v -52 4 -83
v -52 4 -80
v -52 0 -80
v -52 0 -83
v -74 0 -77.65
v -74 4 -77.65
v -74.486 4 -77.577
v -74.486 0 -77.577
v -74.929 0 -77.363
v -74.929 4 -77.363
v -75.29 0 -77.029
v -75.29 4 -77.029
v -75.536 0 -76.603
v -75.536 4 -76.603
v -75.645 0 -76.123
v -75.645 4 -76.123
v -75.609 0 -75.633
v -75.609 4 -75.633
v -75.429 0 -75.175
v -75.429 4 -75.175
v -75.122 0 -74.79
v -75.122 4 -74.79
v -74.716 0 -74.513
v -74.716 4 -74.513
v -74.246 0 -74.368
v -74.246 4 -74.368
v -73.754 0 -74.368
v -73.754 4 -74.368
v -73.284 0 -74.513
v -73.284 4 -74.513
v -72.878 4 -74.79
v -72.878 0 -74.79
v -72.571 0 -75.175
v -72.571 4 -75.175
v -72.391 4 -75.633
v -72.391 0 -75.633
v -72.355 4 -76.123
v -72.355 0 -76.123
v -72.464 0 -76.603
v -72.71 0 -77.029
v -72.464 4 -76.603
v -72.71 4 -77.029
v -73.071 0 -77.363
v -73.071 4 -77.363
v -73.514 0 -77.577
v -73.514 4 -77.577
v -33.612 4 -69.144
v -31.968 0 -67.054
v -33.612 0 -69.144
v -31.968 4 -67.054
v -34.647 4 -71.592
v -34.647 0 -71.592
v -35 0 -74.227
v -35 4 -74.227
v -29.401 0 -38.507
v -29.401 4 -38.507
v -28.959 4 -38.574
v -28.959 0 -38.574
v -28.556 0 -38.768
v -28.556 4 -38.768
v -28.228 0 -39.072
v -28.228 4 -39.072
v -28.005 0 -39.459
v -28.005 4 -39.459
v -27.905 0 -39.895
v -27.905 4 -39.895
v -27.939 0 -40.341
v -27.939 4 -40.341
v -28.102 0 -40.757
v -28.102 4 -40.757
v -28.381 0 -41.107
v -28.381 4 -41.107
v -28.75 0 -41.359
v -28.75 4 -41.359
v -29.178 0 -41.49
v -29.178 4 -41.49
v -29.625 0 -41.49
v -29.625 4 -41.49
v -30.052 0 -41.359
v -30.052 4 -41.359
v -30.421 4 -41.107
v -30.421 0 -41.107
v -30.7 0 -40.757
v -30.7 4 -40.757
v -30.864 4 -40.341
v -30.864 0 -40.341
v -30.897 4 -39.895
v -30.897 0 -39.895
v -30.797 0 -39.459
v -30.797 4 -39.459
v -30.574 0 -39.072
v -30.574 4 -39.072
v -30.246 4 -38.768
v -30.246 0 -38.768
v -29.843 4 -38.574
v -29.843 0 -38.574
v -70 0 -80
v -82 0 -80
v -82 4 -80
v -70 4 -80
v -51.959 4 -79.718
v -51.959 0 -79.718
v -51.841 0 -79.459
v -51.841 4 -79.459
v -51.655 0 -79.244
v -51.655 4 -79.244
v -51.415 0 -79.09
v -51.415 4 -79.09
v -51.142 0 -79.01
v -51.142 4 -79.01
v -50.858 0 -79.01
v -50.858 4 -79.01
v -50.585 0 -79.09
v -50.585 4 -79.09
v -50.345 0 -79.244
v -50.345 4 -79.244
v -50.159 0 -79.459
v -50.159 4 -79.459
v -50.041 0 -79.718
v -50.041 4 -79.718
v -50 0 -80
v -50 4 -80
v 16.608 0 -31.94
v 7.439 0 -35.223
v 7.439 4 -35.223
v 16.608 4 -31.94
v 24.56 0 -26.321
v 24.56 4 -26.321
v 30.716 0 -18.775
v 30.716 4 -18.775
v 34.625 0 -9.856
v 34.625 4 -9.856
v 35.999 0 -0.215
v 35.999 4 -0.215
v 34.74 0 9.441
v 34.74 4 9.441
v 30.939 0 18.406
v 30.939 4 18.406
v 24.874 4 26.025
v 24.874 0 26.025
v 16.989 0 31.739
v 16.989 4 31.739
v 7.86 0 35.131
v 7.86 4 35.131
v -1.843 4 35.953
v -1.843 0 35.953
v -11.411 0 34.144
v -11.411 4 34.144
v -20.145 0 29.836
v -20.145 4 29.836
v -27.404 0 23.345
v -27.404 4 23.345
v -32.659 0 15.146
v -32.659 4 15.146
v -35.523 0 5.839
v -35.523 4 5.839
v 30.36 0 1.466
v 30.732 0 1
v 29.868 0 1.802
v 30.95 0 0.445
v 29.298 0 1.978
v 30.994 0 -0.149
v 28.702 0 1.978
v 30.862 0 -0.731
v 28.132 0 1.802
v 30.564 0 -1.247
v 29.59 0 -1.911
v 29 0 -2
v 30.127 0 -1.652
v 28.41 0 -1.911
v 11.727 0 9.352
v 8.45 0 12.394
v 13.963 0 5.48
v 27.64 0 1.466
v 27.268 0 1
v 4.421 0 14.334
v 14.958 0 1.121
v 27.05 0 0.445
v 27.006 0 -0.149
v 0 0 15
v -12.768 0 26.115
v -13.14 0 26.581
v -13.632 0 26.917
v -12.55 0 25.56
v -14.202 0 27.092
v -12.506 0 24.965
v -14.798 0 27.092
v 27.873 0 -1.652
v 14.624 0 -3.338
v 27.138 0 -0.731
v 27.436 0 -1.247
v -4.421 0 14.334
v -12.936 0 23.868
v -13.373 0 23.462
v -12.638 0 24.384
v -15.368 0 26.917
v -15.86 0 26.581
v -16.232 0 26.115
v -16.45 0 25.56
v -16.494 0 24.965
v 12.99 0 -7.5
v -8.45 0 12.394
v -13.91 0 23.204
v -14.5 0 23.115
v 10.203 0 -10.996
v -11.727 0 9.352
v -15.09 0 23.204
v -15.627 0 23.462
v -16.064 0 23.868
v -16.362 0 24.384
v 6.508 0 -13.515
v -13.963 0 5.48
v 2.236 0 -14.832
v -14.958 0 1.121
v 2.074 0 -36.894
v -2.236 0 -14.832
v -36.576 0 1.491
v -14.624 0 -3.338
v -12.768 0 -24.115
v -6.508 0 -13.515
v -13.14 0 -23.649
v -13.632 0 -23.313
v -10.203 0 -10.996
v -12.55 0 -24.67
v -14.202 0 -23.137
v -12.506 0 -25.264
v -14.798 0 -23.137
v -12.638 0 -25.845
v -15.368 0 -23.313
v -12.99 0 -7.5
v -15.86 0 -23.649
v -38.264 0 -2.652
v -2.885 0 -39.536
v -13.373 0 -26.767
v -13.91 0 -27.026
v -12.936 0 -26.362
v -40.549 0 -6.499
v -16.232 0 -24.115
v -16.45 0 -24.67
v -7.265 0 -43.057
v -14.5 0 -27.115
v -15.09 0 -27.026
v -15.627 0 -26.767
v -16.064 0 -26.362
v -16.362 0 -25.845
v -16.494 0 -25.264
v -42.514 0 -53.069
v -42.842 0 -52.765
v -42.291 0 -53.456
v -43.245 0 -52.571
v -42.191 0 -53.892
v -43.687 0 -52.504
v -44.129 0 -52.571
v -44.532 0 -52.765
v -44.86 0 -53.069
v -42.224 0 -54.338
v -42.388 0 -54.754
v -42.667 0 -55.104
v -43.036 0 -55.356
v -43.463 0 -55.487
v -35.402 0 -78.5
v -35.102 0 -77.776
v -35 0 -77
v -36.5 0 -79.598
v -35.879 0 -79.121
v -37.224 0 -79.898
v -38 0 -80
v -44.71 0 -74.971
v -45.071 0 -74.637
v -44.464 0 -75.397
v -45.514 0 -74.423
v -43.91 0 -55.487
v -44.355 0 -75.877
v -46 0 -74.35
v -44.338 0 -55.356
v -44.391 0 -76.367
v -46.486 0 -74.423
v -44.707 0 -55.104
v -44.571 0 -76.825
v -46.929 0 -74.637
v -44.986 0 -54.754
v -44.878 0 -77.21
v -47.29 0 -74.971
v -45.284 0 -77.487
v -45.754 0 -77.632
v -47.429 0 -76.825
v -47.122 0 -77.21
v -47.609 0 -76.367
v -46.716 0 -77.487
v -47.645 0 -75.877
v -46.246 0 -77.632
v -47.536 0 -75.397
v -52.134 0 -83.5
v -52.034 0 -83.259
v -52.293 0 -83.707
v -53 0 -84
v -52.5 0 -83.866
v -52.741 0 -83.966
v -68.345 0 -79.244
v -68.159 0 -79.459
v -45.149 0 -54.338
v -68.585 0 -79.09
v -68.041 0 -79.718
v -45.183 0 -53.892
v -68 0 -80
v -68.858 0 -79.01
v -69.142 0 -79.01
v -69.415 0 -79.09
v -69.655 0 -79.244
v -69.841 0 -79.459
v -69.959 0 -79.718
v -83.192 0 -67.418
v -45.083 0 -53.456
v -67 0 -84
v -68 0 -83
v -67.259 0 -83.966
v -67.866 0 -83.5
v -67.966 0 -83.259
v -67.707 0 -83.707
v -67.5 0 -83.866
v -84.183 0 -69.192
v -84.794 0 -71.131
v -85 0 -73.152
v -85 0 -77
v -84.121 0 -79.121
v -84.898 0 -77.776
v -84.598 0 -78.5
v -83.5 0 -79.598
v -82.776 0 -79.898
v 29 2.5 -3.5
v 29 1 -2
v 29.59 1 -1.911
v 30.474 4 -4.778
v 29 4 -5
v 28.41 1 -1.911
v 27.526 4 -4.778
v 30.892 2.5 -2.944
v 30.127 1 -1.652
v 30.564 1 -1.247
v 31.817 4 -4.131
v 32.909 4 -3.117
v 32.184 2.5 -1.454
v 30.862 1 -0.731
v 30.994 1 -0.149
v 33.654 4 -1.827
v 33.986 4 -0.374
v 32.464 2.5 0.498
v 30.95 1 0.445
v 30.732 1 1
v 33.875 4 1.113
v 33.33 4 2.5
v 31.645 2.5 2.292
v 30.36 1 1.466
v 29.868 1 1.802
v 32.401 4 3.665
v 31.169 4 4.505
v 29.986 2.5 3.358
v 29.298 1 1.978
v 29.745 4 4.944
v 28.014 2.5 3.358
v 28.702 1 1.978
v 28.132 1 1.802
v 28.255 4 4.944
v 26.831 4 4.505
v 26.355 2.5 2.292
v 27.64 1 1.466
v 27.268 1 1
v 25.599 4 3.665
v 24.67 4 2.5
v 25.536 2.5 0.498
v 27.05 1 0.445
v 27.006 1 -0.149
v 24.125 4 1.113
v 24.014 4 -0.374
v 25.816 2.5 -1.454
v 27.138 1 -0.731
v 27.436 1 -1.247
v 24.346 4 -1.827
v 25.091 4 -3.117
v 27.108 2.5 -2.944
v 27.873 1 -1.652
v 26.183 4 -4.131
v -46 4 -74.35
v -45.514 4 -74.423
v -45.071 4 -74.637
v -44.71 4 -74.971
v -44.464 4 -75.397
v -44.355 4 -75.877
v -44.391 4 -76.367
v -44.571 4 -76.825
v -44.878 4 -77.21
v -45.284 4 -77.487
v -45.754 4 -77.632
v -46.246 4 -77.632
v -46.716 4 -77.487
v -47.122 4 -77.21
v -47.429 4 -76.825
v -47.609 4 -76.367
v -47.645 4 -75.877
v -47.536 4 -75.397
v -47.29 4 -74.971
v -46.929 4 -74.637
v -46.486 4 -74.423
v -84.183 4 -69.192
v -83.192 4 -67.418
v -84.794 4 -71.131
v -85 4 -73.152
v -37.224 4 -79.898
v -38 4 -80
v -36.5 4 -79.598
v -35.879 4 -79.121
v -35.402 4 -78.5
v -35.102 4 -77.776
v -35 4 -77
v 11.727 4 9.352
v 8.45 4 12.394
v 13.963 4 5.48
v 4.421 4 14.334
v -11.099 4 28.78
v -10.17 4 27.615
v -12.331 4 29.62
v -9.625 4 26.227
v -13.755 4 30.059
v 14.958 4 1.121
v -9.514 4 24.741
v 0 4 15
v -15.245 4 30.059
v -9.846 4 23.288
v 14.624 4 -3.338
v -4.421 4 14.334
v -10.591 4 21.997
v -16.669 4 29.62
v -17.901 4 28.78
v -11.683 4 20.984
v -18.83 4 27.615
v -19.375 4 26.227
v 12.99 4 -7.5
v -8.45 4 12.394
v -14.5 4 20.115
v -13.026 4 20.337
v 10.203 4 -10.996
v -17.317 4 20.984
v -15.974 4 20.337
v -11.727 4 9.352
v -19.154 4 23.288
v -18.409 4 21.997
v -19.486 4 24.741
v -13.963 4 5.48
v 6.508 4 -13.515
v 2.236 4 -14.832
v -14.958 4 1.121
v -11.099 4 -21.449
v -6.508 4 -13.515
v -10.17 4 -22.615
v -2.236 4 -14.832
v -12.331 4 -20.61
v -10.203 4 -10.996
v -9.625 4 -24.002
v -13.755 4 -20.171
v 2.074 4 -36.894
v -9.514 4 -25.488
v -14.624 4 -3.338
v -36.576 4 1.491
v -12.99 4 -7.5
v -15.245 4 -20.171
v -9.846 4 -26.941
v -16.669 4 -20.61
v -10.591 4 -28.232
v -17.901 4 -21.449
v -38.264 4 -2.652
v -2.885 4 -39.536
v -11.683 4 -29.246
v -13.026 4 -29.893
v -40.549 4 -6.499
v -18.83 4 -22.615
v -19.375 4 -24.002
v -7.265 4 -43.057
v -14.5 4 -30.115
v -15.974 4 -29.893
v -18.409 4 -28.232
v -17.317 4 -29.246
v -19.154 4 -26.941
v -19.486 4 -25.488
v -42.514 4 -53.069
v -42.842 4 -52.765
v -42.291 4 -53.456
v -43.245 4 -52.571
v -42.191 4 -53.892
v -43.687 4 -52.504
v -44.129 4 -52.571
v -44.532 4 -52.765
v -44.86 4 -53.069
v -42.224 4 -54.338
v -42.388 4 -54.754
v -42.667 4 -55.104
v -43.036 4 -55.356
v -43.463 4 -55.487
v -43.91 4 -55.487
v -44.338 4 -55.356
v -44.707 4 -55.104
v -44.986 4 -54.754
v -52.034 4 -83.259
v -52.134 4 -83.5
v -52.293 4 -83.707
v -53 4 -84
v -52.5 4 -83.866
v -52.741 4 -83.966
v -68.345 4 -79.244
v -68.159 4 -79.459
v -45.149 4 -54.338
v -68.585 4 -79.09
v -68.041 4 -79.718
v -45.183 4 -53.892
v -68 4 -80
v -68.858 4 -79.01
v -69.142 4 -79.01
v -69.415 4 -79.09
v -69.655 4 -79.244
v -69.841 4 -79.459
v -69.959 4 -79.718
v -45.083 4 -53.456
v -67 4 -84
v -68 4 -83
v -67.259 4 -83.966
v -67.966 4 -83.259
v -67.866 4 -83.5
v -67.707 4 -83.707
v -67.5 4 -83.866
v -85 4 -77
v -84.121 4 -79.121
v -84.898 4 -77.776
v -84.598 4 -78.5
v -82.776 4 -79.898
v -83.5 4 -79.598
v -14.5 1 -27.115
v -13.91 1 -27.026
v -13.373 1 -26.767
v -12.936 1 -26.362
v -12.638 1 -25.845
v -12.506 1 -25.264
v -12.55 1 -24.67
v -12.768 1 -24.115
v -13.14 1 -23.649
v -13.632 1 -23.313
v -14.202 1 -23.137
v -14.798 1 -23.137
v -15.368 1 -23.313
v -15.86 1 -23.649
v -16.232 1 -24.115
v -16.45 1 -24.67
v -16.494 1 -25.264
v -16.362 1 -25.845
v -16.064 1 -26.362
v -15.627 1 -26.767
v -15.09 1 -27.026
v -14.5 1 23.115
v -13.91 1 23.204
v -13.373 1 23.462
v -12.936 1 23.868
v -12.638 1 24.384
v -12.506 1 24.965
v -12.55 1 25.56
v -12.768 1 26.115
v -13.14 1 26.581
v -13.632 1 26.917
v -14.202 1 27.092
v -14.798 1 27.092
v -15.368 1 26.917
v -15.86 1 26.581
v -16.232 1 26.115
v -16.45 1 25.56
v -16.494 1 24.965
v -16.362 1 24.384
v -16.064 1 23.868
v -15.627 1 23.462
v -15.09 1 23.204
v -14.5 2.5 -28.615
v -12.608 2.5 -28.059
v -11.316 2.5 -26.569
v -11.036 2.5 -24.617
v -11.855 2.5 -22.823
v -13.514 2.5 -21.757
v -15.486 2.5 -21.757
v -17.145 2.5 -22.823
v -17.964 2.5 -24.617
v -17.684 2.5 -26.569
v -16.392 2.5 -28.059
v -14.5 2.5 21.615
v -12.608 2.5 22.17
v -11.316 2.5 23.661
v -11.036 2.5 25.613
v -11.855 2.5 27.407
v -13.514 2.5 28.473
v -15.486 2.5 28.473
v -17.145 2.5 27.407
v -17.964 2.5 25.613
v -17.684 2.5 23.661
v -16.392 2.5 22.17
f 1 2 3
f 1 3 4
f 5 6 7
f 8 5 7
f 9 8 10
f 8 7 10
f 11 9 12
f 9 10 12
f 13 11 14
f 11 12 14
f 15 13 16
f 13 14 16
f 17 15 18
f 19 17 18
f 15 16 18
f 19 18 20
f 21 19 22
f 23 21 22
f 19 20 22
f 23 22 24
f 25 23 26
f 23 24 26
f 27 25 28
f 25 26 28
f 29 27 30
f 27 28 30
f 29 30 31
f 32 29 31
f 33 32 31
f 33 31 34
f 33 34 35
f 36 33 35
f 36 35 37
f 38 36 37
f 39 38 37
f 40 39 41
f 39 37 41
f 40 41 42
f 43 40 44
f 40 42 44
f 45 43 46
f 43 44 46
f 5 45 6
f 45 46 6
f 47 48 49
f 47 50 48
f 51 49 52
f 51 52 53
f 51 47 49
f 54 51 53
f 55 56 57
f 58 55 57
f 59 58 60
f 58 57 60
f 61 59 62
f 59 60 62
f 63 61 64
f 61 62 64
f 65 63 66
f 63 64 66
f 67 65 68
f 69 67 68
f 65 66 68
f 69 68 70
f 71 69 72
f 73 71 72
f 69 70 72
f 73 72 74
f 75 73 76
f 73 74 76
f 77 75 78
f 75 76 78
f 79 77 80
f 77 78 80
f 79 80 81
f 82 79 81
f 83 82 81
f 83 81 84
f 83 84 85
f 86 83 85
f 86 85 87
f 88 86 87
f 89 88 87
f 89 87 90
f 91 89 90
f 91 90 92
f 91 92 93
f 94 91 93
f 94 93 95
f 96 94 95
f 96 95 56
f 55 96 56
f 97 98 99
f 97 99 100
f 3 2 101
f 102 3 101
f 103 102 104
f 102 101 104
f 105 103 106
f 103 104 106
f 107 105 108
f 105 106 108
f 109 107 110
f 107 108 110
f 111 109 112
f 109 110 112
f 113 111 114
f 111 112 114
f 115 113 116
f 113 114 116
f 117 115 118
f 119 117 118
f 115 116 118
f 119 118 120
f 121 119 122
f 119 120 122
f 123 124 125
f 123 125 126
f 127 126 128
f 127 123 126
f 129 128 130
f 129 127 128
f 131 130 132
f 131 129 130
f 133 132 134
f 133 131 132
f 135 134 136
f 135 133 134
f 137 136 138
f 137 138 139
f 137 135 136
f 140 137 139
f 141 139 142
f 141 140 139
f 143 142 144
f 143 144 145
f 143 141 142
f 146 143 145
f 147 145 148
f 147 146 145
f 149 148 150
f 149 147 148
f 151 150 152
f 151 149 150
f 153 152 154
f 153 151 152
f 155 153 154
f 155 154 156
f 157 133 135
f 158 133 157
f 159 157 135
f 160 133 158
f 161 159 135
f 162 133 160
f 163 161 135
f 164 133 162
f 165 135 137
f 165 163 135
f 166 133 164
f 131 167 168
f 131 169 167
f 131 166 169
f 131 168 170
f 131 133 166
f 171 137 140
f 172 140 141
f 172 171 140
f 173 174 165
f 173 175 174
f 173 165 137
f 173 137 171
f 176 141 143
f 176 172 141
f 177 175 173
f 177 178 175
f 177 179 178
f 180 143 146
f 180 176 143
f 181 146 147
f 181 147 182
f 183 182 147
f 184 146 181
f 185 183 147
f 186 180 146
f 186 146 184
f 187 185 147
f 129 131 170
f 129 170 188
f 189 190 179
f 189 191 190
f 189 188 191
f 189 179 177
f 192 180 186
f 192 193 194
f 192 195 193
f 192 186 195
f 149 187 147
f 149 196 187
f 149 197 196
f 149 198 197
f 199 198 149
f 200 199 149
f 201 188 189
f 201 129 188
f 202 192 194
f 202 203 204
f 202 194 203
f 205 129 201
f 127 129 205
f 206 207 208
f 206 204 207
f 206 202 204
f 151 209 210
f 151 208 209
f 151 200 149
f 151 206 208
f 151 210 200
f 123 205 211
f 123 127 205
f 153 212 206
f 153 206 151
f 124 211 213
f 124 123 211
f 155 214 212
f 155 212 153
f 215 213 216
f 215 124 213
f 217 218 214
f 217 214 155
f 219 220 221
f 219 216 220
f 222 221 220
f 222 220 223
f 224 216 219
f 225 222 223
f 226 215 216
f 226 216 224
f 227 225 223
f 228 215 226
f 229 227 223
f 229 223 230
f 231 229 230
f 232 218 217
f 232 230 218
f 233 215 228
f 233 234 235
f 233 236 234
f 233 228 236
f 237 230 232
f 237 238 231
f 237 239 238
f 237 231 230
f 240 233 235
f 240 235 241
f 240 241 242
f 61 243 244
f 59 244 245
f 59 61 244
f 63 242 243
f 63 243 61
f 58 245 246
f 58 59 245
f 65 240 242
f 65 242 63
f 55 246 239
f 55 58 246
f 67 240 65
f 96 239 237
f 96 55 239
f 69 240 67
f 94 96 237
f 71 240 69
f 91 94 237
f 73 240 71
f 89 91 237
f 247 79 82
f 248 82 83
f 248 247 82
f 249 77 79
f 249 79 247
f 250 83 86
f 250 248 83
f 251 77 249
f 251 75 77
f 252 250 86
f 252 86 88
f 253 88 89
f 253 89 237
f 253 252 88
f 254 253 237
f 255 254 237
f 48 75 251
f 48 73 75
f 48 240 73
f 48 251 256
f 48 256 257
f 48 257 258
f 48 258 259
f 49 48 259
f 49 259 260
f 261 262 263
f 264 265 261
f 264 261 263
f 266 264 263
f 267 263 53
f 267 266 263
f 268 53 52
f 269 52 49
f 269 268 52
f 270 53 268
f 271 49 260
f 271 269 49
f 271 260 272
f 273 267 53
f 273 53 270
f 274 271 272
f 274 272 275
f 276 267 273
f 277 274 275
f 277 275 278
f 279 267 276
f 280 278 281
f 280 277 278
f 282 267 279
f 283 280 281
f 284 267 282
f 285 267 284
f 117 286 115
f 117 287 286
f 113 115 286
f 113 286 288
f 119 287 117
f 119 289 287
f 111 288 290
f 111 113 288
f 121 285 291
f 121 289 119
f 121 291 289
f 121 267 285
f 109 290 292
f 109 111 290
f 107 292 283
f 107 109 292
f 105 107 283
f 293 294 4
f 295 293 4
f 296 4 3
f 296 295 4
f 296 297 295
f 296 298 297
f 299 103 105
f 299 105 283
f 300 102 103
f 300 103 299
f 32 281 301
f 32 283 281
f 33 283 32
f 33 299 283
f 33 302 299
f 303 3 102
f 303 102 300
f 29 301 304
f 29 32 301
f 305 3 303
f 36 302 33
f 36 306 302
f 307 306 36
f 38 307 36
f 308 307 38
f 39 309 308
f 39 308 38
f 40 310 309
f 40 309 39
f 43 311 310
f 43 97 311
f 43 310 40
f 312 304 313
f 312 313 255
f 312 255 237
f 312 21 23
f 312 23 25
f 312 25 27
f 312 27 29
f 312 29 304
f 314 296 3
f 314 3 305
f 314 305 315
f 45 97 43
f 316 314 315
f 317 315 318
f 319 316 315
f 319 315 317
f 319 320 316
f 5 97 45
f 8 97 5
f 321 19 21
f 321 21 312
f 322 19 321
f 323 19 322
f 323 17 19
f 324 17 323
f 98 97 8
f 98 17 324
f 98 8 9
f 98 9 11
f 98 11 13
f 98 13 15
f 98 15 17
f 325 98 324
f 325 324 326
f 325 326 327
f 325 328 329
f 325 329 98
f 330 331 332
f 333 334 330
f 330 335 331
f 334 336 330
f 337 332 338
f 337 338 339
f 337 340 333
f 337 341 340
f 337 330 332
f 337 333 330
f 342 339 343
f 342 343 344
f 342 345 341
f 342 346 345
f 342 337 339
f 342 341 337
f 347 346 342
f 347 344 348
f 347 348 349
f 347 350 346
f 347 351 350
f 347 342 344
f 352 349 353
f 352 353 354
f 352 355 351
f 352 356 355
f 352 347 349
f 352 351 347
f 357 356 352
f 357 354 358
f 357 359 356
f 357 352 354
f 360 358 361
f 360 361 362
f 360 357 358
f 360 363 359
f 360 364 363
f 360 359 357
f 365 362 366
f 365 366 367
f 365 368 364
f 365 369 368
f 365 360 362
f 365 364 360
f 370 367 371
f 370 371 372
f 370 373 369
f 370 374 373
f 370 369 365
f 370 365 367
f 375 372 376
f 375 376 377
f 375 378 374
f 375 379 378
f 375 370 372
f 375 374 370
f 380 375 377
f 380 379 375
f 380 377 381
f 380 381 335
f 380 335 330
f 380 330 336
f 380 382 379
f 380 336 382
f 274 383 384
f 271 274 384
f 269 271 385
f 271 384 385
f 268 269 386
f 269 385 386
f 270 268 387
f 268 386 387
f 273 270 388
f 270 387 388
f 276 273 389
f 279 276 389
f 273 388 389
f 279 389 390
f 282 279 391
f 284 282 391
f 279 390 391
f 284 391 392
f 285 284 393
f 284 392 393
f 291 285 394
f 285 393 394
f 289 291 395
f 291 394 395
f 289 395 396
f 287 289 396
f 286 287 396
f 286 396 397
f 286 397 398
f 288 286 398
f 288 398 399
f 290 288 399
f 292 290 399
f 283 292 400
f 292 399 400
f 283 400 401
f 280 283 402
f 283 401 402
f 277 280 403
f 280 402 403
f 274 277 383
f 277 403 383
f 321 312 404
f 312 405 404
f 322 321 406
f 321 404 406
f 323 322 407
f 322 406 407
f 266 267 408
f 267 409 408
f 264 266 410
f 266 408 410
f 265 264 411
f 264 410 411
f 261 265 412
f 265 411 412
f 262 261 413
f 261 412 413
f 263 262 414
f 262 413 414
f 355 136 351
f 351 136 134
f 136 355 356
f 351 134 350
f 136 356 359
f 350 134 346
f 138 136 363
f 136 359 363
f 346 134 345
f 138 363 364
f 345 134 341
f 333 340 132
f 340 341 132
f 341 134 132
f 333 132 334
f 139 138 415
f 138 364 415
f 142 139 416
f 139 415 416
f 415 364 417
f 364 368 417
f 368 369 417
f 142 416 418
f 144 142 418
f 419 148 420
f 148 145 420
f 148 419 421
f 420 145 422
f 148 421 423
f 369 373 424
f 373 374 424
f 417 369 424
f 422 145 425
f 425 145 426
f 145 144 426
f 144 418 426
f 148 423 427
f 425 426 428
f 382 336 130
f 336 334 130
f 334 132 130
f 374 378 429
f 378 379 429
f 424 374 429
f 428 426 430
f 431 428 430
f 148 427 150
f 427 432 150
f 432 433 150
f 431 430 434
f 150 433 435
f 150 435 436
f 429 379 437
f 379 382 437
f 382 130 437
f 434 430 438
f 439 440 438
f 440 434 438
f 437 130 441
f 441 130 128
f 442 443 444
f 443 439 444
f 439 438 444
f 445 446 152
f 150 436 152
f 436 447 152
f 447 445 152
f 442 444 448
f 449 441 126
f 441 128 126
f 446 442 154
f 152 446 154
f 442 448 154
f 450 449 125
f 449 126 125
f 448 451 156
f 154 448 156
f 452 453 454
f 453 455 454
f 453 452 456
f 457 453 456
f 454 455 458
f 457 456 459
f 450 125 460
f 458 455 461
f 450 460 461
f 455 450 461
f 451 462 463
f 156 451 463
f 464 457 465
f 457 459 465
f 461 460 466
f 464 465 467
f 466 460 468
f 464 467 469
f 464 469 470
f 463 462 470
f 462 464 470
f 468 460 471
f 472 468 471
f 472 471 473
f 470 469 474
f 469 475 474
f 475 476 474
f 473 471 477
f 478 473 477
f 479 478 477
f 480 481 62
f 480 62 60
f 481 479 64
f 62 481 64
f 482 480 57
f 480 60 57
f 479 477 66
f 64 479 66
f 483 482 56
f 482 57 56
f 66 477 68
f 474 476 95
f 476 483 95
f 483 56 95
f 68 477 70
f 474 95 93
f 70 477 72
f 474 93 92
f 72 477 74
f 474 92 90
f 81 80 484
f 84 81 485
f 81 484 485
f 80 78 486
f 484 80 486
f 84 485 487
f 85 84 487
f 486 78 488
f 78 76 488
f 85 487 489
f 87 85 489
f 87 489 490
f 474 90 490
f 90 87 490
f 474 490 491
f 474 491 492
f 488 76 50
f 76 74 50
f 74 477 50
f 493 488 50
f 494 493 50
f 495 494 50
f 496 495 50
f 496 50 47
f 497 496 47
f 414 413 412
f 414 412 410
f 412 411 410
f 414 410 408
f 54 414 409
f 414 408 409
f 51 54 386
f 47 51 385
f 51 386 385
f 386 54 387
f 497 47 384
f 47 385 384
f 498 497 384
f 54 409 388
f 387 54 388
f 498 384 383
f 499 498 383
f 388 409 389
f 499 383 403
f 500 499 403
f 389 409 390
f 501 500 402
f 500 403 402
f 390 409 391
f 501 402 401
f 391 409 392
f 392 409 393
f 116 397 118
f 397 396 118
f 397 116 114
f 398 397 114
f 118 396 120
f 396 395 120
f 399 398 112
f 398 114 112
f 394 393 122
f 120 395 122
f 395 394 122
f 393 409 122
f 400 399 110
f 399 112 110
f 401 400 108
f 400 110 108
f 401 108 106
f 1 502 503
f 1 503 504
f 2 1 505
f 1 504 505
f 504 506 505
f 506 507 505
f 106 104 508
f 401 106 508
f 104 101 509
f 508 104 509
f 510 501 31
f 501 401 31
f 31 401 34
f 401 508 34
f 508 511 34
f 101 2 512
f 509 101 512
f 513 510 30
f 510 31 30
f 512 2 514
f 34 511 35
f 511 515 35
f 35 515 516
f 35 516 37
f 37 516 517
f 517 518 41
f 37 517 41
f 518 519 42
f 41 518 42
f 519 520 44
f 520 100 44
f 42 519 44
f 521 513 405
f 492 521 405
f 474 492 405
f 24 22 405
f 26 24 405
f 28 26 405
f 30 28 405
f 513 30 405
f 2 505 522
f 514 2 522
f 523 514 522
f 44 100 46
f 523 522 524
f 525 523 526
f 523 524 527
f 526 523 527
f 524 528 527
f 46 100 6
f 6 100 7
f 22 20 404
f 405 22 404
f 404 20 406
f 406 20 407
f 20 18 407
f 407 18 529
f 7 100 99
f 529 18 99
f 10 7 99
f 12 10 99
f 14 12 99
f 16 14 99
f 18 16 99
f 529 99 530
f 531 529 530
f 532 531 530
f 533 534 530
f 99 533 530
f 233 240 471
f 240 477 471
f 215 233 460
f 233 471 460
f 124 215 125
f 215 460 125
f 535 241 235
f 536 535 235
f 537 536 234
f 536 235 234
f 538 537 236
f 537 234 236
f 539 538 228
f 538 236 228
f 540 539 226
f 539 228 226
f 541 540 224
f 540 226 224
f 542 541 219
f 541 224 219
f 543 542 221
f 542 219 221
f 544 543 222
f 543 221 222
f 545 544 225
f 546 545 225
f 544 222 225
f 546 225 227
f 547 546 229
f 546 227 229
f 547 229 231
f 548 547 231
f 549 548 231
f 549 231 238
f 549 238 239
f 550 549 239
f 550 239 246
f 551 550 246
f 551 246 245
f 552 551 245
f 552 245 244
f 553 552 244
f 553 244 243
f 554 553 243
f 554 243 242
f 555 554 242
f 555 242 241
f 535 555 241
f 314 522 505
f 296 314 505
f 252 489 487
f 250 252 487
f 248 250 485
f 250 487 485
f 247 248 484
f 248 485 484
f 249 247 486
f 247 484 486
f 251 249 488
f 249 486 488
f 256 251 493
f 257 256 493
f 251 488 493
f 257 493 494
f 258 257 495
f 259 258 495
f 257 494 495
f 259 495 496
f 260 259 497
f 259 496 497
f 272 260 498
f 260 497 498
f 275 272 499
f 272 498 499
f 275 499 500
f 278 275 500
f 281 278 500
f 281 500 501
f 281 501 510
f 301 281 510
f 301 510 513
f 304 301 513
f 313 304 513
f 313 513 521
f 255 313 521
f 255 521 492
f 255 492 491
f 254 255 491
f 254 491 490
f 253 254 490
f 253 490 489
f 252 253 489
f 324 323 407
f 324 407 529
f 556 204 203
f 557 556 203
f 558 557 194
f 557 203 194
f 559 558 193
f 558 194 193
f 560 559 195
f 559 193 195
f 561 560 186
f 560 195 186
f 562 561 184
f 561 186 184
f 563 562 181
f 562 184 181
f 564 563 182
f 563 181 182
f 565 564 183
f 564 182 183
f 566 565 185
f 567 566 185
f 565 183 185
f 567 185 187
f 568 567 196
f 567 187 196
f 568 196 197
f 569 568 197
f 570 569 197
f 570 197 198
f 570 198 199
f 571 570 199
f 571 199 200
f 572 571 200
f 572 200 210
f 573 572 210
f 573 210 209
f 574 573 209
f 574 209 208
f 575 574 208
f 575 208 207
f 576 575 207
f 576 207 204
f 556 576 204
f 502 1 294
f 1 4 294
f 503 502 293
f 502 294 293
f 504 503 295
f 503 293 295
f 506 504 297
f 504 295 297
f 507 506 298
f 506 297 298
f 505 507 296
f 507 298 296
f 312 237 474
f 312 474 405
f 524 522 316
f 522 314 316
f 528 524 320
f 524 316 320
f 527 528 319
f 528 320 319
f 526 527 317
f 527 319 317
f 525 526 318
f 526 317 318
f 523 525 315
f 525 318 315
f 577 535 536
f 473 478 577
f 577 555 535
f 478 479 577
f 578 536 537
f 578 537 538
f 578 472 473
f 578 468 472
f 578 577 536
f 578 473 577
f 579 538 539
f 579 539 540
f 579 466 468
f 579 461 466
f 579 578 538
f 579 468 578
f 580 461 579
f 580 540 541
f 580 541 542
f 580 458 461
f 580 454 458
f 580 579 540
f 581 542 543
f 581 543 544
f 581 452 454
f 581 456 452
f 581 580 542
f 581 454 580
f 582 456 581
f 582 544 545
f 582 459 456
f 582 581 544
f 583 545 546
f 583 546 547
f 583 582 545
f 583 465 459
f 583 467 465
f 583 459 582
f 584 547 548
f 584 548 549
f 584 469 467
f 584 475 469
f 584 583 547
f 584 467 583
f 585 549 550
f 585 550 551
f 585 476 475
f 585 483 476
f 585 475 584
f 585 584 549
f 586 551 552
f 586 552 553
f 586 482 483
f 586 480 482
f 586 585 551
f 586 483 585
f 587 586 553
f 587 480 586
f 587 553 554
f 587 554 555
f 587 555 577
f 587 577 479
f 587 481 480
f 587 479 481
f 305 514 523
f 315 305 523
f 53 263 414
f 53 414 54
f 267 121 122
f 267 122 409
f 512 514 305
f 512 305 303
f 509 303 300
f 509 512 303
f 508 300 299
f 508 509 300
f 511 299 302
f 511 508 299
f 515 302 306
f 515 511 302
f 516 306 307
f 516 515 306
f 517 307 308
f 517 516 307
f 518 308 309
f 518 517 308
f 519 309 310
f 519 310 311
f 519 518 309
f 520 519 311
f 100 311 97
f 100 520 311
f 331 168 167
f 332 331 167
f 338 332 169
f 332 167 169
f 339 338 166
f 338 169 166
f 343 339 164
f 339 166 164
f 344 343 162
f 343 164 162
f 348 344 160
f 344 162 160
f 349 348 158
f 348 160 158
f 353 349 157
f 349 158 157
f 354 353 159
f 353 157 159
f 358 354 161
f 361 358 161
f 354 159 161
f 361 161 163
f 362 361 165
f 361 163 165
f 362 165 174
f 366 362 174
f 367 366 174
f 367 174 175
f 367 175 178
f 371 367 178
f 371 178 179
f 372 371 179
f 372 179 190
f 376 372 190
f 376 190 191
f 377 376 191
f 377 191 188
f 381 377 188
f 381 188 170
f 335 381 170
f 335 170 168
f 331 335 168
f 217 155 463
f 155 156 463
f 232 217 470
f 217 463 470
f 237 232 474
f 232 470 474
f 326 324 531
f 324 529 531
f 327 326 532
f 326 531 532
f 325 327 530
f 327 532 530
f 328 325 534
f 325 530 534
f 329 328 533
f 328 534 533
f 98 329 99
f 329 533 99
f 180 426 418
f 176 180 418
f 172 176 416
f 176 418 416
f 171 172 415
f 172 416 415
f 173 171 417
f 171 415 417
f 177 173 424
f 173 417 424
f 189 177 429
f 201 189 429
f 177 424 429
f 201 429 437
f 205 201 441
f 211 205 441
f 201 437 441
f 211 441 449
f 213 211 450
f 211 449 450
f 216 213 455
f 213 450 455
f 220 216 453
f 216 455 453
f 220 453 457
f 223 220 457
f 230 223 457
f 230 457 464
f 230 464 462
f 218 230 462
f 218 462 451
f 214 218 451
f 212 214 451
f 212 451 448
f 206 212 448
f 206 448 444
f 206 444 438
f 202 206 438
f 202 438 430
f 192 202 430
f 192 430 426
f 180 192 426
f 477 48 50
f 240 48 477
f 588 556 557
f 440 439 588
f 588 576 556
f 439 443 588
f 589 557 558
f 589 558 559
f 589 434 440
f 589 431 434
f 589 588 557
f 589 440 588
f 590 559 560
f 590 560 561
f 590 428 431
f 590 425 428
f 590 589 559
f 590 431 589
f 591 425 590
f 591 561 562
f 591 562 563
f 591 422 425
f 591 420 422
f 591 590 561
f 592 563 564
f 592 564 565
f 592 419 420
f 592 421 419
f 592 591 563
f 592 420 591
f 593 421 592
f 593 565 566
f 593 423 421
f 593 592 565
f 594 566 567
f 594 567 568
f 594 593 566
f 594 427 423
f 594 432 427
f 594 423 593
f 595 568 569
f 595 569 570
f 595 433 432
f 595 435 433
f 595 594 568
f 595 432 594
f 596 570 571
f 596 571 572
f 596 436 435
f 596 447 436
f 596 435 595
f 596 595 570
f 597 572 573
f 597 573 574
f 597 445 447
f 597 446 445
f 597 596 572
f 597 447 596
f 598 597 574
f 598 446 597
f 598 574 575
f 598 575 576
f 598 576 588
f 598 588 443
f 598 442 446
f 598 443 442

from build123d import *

# Parameters (mm, degrees)
EXTRUDE_1_DEPTH     = 4
FILLET_1_R          = 30
FILLET_2_R          = 30
SKETCH_4_R          = 1.65
CUT_EXTRUDE_3_DEPTH = 4
FILLET_4_R          = 10
FILLET_5_R          = 3
SKETCH_7_W          = 16
SKETCH_7_H          = 4
EXTRUDE_3_DEPTH     = 4
CUT_EXTRUDE_5_DEPTH = 4
FILLET_7_R          = 1
SKETCH_9_R          = 15
CUT_EXTRUDE_6_DEPTH = 10
SKETCH_10_R         = 2
CUT_EXTRUDE_7_DEPTH = 10
CHAMFER_1_SIZE      = 3
SKETCH_11_R         = 1.2
CUT_EXTRUDE_8_DEPTH = 10
SKETCH_12_R         = 1.5
CUT_EXTRUDE_9_DEPTH = 10


with BuildPart() as part:
    # 草图1 → 凸台-拉伸1 (new body)
    with BuildSketch(Plane(origin=(0, 0, 0), x_dir=(1, 0, 0), z_dir=(0, 1, 0))):
        with BuildLine():
            Line((-85, 80), (-35, 80))
            Line((-35, 80), (-35, 70))
            Line((-35, 70), (0, 36))
            ThreePointArc((0, 36), (25.455844123, -25.455844123), (-36, 0))
            Line((-36, 0), (-85, 70))
            Line((-85, 70), (-85, 80))
        make_face()
    extrude(amount=EXTRUDE_1_DEPTH)

    # 圆角1
    fillet_1_edges = [part.edges().sort_by_distance(p)[0] for p in [
        (0, 2, -36),
    ]]
    fillet(fillet_1_edges, radius=FILLET_1_R)

    # 圆角2
    fillet_2_edges = [part.edges().sort_by_distance(p)[0] for p in [
        (-36, 2, 0),
    ]]
    fillet(fillet_2_edges, radius=FILLET_2_R)

    # 草图4 → 切除-拉伸3 (cut)
    with BuildSketch(Plane(origin=(0, 4, 0), x_dir=(1, 0, 0), z_dir=(0, 1, 0))):
        with Locations(Location((-46, 76, 0), (0, 0, 270))):
            Circle(SKETCH_4_R)
        with Locations(Location((-74, 76, 0), (0, 0, 90))):
            Circle(SKETCH_4_R)
    extrude(amount=-CUT_EXTRUDE_3_DEPTH, mode=Mode.SUBTRACT)

    # 圆角4
    fillet_4_edges = [part.edges().sort_by_distance(p)[0] for p in [
        (-35, 2, -70),
        (-85, 2, -70),
    ]]
    fillet(fillet_4_edges, radius=FILLET_4_R)

    # 圆角5
    fillet_5_edges = [part.edges().sort_by_distance(p)[0] for p in [
        (-85, 2, -80),
        (-35, 2, -80),
    ]]
    fillet(fillet_5_edges, radius=FILLET_5_R)

    # 草图7 → 凸台-拉伸3 (add)
    with BuildSketch(Plane(origin=(0, 4, 0), x_dir=(1, 0, 0), z_dir=(0, 1, 0))):
        with Locations((-60, 82)):
            Rectangle(SKETCH_7_W, SKETCH_7_H)
    extrude(amount=-EXTRUDE_3_DEPTH)

    # 草图8 → 切除-拉伸5 (cut)
    with BuildSketch(Plane(origin=(0, 4, 0), x_dir=(1, 0, 0), z_dir=(0, 1, 0))):
        with BuildLine():
            Line((-50, 80), (-52, 80))
            ThreePointArc((-52, 80), (-51, 79), (-50, 80))
        make_face()
        with BuildLine():
            Line((-70, 80), (-68, 80))
            ThreePointArc((-68, 80), (-69, 79), (-70, 80))
        make_face()
    extrude(amount=-CUT_EXTRUDE_5_DEPTH, mode=Mode.SUBTRACT)

    # 圆角7
    fillet_7_edges = [part.edges().sort_by_distance(p)[0] for p in [
        (-52, 2, -84),
        (-68, 2, -84),
    ]]
    fillet(fillet_7_edges, radius=FILLET_7_R)

    # 草图9 → 切除-拉伸6 (cut)
    with BuildSketch(Plane(origin=(0, 4, 0), x_dir=(1, 0, 0), z_dir=(0, 1, 0))):
        with Locations(Location((0, 0, 0), (0, 0, 270))):
            Circle(SKETCH_9_R)
    extrude(amount=-CUT_EXTRUDE_6_DEPTH, mode=Mode.SUBTRACT)

    # 草图10 → 切除-拉伸7 (cut)
    with BuildSketch(Plane.XZ):
        with Locations(Location((29, 0, 0), (0, 0, 270))):
            Circle(SKETCH_10_R)
        with Locations(Location((-14.5, -25.11473671, 0), (0, 0, 270))):
            Circle(SKETCH_10_R)
        with Locations(Location((-14.5, 25.11473671, 0), (0, 0, 270))):
            Circle(SKETCH_10_R)
    extrude(amount=-CUT_EXTRUDE_7_DEPTH, mode=Mode.SUBTRACT)

    # 倒角1
    chamfer_1_edges = [part.edges().sort_by_distance(p)[0] for p in [
        (29, 4, 2),
        (-14.5, 4, -23.11473671),
        (-14.5, 4, 27.11473671),
    ]]
    chamfer(chamfer_1_edges, length=CHAMFER_1_SIZE)

    # 草图11 → 切除-拉伸8 (cut)
    with BuildSketch(Plane(origin=(0, 4, 0), x_dir=(1, 0, 0), z_dir=(0, 1, 0))):
        with Locations(Location((-29.401166302, 40.007142113, 0), (0, 0, 270))):
            Circle(SKETCH_11_R)
        with Locations(Location((-43.686880588, 54.004226358, 0), (0, 0, 270))):
            Circle(SKETCH_11_R)
    extrude(amount=-CUT_EXTRUDE_8_DEPTH, mode=Mode.SUBTRACT)

    # 草图12 → 切除-拉伸9 (cut)
    with BuildSketch(Plane(origin=(0, 4, 0), x_dir=(1, 0, 0), z_dir=(0, 1, 0))):
        with Locations(Location((-43.686880588, 54.004226358, 0), (0, 0, 270))):
            Circle(SKETCH_12_R)
        with Locations(Location((-29.401166302, 40.007142113, 0), (0, 0, 270))):
            Circle(SKETCH_12_R)
    extrude(amount=-CUT_EXTRUDE_9_DEPTH, mode=Mode.SUBTRACT)


solid = part.part
